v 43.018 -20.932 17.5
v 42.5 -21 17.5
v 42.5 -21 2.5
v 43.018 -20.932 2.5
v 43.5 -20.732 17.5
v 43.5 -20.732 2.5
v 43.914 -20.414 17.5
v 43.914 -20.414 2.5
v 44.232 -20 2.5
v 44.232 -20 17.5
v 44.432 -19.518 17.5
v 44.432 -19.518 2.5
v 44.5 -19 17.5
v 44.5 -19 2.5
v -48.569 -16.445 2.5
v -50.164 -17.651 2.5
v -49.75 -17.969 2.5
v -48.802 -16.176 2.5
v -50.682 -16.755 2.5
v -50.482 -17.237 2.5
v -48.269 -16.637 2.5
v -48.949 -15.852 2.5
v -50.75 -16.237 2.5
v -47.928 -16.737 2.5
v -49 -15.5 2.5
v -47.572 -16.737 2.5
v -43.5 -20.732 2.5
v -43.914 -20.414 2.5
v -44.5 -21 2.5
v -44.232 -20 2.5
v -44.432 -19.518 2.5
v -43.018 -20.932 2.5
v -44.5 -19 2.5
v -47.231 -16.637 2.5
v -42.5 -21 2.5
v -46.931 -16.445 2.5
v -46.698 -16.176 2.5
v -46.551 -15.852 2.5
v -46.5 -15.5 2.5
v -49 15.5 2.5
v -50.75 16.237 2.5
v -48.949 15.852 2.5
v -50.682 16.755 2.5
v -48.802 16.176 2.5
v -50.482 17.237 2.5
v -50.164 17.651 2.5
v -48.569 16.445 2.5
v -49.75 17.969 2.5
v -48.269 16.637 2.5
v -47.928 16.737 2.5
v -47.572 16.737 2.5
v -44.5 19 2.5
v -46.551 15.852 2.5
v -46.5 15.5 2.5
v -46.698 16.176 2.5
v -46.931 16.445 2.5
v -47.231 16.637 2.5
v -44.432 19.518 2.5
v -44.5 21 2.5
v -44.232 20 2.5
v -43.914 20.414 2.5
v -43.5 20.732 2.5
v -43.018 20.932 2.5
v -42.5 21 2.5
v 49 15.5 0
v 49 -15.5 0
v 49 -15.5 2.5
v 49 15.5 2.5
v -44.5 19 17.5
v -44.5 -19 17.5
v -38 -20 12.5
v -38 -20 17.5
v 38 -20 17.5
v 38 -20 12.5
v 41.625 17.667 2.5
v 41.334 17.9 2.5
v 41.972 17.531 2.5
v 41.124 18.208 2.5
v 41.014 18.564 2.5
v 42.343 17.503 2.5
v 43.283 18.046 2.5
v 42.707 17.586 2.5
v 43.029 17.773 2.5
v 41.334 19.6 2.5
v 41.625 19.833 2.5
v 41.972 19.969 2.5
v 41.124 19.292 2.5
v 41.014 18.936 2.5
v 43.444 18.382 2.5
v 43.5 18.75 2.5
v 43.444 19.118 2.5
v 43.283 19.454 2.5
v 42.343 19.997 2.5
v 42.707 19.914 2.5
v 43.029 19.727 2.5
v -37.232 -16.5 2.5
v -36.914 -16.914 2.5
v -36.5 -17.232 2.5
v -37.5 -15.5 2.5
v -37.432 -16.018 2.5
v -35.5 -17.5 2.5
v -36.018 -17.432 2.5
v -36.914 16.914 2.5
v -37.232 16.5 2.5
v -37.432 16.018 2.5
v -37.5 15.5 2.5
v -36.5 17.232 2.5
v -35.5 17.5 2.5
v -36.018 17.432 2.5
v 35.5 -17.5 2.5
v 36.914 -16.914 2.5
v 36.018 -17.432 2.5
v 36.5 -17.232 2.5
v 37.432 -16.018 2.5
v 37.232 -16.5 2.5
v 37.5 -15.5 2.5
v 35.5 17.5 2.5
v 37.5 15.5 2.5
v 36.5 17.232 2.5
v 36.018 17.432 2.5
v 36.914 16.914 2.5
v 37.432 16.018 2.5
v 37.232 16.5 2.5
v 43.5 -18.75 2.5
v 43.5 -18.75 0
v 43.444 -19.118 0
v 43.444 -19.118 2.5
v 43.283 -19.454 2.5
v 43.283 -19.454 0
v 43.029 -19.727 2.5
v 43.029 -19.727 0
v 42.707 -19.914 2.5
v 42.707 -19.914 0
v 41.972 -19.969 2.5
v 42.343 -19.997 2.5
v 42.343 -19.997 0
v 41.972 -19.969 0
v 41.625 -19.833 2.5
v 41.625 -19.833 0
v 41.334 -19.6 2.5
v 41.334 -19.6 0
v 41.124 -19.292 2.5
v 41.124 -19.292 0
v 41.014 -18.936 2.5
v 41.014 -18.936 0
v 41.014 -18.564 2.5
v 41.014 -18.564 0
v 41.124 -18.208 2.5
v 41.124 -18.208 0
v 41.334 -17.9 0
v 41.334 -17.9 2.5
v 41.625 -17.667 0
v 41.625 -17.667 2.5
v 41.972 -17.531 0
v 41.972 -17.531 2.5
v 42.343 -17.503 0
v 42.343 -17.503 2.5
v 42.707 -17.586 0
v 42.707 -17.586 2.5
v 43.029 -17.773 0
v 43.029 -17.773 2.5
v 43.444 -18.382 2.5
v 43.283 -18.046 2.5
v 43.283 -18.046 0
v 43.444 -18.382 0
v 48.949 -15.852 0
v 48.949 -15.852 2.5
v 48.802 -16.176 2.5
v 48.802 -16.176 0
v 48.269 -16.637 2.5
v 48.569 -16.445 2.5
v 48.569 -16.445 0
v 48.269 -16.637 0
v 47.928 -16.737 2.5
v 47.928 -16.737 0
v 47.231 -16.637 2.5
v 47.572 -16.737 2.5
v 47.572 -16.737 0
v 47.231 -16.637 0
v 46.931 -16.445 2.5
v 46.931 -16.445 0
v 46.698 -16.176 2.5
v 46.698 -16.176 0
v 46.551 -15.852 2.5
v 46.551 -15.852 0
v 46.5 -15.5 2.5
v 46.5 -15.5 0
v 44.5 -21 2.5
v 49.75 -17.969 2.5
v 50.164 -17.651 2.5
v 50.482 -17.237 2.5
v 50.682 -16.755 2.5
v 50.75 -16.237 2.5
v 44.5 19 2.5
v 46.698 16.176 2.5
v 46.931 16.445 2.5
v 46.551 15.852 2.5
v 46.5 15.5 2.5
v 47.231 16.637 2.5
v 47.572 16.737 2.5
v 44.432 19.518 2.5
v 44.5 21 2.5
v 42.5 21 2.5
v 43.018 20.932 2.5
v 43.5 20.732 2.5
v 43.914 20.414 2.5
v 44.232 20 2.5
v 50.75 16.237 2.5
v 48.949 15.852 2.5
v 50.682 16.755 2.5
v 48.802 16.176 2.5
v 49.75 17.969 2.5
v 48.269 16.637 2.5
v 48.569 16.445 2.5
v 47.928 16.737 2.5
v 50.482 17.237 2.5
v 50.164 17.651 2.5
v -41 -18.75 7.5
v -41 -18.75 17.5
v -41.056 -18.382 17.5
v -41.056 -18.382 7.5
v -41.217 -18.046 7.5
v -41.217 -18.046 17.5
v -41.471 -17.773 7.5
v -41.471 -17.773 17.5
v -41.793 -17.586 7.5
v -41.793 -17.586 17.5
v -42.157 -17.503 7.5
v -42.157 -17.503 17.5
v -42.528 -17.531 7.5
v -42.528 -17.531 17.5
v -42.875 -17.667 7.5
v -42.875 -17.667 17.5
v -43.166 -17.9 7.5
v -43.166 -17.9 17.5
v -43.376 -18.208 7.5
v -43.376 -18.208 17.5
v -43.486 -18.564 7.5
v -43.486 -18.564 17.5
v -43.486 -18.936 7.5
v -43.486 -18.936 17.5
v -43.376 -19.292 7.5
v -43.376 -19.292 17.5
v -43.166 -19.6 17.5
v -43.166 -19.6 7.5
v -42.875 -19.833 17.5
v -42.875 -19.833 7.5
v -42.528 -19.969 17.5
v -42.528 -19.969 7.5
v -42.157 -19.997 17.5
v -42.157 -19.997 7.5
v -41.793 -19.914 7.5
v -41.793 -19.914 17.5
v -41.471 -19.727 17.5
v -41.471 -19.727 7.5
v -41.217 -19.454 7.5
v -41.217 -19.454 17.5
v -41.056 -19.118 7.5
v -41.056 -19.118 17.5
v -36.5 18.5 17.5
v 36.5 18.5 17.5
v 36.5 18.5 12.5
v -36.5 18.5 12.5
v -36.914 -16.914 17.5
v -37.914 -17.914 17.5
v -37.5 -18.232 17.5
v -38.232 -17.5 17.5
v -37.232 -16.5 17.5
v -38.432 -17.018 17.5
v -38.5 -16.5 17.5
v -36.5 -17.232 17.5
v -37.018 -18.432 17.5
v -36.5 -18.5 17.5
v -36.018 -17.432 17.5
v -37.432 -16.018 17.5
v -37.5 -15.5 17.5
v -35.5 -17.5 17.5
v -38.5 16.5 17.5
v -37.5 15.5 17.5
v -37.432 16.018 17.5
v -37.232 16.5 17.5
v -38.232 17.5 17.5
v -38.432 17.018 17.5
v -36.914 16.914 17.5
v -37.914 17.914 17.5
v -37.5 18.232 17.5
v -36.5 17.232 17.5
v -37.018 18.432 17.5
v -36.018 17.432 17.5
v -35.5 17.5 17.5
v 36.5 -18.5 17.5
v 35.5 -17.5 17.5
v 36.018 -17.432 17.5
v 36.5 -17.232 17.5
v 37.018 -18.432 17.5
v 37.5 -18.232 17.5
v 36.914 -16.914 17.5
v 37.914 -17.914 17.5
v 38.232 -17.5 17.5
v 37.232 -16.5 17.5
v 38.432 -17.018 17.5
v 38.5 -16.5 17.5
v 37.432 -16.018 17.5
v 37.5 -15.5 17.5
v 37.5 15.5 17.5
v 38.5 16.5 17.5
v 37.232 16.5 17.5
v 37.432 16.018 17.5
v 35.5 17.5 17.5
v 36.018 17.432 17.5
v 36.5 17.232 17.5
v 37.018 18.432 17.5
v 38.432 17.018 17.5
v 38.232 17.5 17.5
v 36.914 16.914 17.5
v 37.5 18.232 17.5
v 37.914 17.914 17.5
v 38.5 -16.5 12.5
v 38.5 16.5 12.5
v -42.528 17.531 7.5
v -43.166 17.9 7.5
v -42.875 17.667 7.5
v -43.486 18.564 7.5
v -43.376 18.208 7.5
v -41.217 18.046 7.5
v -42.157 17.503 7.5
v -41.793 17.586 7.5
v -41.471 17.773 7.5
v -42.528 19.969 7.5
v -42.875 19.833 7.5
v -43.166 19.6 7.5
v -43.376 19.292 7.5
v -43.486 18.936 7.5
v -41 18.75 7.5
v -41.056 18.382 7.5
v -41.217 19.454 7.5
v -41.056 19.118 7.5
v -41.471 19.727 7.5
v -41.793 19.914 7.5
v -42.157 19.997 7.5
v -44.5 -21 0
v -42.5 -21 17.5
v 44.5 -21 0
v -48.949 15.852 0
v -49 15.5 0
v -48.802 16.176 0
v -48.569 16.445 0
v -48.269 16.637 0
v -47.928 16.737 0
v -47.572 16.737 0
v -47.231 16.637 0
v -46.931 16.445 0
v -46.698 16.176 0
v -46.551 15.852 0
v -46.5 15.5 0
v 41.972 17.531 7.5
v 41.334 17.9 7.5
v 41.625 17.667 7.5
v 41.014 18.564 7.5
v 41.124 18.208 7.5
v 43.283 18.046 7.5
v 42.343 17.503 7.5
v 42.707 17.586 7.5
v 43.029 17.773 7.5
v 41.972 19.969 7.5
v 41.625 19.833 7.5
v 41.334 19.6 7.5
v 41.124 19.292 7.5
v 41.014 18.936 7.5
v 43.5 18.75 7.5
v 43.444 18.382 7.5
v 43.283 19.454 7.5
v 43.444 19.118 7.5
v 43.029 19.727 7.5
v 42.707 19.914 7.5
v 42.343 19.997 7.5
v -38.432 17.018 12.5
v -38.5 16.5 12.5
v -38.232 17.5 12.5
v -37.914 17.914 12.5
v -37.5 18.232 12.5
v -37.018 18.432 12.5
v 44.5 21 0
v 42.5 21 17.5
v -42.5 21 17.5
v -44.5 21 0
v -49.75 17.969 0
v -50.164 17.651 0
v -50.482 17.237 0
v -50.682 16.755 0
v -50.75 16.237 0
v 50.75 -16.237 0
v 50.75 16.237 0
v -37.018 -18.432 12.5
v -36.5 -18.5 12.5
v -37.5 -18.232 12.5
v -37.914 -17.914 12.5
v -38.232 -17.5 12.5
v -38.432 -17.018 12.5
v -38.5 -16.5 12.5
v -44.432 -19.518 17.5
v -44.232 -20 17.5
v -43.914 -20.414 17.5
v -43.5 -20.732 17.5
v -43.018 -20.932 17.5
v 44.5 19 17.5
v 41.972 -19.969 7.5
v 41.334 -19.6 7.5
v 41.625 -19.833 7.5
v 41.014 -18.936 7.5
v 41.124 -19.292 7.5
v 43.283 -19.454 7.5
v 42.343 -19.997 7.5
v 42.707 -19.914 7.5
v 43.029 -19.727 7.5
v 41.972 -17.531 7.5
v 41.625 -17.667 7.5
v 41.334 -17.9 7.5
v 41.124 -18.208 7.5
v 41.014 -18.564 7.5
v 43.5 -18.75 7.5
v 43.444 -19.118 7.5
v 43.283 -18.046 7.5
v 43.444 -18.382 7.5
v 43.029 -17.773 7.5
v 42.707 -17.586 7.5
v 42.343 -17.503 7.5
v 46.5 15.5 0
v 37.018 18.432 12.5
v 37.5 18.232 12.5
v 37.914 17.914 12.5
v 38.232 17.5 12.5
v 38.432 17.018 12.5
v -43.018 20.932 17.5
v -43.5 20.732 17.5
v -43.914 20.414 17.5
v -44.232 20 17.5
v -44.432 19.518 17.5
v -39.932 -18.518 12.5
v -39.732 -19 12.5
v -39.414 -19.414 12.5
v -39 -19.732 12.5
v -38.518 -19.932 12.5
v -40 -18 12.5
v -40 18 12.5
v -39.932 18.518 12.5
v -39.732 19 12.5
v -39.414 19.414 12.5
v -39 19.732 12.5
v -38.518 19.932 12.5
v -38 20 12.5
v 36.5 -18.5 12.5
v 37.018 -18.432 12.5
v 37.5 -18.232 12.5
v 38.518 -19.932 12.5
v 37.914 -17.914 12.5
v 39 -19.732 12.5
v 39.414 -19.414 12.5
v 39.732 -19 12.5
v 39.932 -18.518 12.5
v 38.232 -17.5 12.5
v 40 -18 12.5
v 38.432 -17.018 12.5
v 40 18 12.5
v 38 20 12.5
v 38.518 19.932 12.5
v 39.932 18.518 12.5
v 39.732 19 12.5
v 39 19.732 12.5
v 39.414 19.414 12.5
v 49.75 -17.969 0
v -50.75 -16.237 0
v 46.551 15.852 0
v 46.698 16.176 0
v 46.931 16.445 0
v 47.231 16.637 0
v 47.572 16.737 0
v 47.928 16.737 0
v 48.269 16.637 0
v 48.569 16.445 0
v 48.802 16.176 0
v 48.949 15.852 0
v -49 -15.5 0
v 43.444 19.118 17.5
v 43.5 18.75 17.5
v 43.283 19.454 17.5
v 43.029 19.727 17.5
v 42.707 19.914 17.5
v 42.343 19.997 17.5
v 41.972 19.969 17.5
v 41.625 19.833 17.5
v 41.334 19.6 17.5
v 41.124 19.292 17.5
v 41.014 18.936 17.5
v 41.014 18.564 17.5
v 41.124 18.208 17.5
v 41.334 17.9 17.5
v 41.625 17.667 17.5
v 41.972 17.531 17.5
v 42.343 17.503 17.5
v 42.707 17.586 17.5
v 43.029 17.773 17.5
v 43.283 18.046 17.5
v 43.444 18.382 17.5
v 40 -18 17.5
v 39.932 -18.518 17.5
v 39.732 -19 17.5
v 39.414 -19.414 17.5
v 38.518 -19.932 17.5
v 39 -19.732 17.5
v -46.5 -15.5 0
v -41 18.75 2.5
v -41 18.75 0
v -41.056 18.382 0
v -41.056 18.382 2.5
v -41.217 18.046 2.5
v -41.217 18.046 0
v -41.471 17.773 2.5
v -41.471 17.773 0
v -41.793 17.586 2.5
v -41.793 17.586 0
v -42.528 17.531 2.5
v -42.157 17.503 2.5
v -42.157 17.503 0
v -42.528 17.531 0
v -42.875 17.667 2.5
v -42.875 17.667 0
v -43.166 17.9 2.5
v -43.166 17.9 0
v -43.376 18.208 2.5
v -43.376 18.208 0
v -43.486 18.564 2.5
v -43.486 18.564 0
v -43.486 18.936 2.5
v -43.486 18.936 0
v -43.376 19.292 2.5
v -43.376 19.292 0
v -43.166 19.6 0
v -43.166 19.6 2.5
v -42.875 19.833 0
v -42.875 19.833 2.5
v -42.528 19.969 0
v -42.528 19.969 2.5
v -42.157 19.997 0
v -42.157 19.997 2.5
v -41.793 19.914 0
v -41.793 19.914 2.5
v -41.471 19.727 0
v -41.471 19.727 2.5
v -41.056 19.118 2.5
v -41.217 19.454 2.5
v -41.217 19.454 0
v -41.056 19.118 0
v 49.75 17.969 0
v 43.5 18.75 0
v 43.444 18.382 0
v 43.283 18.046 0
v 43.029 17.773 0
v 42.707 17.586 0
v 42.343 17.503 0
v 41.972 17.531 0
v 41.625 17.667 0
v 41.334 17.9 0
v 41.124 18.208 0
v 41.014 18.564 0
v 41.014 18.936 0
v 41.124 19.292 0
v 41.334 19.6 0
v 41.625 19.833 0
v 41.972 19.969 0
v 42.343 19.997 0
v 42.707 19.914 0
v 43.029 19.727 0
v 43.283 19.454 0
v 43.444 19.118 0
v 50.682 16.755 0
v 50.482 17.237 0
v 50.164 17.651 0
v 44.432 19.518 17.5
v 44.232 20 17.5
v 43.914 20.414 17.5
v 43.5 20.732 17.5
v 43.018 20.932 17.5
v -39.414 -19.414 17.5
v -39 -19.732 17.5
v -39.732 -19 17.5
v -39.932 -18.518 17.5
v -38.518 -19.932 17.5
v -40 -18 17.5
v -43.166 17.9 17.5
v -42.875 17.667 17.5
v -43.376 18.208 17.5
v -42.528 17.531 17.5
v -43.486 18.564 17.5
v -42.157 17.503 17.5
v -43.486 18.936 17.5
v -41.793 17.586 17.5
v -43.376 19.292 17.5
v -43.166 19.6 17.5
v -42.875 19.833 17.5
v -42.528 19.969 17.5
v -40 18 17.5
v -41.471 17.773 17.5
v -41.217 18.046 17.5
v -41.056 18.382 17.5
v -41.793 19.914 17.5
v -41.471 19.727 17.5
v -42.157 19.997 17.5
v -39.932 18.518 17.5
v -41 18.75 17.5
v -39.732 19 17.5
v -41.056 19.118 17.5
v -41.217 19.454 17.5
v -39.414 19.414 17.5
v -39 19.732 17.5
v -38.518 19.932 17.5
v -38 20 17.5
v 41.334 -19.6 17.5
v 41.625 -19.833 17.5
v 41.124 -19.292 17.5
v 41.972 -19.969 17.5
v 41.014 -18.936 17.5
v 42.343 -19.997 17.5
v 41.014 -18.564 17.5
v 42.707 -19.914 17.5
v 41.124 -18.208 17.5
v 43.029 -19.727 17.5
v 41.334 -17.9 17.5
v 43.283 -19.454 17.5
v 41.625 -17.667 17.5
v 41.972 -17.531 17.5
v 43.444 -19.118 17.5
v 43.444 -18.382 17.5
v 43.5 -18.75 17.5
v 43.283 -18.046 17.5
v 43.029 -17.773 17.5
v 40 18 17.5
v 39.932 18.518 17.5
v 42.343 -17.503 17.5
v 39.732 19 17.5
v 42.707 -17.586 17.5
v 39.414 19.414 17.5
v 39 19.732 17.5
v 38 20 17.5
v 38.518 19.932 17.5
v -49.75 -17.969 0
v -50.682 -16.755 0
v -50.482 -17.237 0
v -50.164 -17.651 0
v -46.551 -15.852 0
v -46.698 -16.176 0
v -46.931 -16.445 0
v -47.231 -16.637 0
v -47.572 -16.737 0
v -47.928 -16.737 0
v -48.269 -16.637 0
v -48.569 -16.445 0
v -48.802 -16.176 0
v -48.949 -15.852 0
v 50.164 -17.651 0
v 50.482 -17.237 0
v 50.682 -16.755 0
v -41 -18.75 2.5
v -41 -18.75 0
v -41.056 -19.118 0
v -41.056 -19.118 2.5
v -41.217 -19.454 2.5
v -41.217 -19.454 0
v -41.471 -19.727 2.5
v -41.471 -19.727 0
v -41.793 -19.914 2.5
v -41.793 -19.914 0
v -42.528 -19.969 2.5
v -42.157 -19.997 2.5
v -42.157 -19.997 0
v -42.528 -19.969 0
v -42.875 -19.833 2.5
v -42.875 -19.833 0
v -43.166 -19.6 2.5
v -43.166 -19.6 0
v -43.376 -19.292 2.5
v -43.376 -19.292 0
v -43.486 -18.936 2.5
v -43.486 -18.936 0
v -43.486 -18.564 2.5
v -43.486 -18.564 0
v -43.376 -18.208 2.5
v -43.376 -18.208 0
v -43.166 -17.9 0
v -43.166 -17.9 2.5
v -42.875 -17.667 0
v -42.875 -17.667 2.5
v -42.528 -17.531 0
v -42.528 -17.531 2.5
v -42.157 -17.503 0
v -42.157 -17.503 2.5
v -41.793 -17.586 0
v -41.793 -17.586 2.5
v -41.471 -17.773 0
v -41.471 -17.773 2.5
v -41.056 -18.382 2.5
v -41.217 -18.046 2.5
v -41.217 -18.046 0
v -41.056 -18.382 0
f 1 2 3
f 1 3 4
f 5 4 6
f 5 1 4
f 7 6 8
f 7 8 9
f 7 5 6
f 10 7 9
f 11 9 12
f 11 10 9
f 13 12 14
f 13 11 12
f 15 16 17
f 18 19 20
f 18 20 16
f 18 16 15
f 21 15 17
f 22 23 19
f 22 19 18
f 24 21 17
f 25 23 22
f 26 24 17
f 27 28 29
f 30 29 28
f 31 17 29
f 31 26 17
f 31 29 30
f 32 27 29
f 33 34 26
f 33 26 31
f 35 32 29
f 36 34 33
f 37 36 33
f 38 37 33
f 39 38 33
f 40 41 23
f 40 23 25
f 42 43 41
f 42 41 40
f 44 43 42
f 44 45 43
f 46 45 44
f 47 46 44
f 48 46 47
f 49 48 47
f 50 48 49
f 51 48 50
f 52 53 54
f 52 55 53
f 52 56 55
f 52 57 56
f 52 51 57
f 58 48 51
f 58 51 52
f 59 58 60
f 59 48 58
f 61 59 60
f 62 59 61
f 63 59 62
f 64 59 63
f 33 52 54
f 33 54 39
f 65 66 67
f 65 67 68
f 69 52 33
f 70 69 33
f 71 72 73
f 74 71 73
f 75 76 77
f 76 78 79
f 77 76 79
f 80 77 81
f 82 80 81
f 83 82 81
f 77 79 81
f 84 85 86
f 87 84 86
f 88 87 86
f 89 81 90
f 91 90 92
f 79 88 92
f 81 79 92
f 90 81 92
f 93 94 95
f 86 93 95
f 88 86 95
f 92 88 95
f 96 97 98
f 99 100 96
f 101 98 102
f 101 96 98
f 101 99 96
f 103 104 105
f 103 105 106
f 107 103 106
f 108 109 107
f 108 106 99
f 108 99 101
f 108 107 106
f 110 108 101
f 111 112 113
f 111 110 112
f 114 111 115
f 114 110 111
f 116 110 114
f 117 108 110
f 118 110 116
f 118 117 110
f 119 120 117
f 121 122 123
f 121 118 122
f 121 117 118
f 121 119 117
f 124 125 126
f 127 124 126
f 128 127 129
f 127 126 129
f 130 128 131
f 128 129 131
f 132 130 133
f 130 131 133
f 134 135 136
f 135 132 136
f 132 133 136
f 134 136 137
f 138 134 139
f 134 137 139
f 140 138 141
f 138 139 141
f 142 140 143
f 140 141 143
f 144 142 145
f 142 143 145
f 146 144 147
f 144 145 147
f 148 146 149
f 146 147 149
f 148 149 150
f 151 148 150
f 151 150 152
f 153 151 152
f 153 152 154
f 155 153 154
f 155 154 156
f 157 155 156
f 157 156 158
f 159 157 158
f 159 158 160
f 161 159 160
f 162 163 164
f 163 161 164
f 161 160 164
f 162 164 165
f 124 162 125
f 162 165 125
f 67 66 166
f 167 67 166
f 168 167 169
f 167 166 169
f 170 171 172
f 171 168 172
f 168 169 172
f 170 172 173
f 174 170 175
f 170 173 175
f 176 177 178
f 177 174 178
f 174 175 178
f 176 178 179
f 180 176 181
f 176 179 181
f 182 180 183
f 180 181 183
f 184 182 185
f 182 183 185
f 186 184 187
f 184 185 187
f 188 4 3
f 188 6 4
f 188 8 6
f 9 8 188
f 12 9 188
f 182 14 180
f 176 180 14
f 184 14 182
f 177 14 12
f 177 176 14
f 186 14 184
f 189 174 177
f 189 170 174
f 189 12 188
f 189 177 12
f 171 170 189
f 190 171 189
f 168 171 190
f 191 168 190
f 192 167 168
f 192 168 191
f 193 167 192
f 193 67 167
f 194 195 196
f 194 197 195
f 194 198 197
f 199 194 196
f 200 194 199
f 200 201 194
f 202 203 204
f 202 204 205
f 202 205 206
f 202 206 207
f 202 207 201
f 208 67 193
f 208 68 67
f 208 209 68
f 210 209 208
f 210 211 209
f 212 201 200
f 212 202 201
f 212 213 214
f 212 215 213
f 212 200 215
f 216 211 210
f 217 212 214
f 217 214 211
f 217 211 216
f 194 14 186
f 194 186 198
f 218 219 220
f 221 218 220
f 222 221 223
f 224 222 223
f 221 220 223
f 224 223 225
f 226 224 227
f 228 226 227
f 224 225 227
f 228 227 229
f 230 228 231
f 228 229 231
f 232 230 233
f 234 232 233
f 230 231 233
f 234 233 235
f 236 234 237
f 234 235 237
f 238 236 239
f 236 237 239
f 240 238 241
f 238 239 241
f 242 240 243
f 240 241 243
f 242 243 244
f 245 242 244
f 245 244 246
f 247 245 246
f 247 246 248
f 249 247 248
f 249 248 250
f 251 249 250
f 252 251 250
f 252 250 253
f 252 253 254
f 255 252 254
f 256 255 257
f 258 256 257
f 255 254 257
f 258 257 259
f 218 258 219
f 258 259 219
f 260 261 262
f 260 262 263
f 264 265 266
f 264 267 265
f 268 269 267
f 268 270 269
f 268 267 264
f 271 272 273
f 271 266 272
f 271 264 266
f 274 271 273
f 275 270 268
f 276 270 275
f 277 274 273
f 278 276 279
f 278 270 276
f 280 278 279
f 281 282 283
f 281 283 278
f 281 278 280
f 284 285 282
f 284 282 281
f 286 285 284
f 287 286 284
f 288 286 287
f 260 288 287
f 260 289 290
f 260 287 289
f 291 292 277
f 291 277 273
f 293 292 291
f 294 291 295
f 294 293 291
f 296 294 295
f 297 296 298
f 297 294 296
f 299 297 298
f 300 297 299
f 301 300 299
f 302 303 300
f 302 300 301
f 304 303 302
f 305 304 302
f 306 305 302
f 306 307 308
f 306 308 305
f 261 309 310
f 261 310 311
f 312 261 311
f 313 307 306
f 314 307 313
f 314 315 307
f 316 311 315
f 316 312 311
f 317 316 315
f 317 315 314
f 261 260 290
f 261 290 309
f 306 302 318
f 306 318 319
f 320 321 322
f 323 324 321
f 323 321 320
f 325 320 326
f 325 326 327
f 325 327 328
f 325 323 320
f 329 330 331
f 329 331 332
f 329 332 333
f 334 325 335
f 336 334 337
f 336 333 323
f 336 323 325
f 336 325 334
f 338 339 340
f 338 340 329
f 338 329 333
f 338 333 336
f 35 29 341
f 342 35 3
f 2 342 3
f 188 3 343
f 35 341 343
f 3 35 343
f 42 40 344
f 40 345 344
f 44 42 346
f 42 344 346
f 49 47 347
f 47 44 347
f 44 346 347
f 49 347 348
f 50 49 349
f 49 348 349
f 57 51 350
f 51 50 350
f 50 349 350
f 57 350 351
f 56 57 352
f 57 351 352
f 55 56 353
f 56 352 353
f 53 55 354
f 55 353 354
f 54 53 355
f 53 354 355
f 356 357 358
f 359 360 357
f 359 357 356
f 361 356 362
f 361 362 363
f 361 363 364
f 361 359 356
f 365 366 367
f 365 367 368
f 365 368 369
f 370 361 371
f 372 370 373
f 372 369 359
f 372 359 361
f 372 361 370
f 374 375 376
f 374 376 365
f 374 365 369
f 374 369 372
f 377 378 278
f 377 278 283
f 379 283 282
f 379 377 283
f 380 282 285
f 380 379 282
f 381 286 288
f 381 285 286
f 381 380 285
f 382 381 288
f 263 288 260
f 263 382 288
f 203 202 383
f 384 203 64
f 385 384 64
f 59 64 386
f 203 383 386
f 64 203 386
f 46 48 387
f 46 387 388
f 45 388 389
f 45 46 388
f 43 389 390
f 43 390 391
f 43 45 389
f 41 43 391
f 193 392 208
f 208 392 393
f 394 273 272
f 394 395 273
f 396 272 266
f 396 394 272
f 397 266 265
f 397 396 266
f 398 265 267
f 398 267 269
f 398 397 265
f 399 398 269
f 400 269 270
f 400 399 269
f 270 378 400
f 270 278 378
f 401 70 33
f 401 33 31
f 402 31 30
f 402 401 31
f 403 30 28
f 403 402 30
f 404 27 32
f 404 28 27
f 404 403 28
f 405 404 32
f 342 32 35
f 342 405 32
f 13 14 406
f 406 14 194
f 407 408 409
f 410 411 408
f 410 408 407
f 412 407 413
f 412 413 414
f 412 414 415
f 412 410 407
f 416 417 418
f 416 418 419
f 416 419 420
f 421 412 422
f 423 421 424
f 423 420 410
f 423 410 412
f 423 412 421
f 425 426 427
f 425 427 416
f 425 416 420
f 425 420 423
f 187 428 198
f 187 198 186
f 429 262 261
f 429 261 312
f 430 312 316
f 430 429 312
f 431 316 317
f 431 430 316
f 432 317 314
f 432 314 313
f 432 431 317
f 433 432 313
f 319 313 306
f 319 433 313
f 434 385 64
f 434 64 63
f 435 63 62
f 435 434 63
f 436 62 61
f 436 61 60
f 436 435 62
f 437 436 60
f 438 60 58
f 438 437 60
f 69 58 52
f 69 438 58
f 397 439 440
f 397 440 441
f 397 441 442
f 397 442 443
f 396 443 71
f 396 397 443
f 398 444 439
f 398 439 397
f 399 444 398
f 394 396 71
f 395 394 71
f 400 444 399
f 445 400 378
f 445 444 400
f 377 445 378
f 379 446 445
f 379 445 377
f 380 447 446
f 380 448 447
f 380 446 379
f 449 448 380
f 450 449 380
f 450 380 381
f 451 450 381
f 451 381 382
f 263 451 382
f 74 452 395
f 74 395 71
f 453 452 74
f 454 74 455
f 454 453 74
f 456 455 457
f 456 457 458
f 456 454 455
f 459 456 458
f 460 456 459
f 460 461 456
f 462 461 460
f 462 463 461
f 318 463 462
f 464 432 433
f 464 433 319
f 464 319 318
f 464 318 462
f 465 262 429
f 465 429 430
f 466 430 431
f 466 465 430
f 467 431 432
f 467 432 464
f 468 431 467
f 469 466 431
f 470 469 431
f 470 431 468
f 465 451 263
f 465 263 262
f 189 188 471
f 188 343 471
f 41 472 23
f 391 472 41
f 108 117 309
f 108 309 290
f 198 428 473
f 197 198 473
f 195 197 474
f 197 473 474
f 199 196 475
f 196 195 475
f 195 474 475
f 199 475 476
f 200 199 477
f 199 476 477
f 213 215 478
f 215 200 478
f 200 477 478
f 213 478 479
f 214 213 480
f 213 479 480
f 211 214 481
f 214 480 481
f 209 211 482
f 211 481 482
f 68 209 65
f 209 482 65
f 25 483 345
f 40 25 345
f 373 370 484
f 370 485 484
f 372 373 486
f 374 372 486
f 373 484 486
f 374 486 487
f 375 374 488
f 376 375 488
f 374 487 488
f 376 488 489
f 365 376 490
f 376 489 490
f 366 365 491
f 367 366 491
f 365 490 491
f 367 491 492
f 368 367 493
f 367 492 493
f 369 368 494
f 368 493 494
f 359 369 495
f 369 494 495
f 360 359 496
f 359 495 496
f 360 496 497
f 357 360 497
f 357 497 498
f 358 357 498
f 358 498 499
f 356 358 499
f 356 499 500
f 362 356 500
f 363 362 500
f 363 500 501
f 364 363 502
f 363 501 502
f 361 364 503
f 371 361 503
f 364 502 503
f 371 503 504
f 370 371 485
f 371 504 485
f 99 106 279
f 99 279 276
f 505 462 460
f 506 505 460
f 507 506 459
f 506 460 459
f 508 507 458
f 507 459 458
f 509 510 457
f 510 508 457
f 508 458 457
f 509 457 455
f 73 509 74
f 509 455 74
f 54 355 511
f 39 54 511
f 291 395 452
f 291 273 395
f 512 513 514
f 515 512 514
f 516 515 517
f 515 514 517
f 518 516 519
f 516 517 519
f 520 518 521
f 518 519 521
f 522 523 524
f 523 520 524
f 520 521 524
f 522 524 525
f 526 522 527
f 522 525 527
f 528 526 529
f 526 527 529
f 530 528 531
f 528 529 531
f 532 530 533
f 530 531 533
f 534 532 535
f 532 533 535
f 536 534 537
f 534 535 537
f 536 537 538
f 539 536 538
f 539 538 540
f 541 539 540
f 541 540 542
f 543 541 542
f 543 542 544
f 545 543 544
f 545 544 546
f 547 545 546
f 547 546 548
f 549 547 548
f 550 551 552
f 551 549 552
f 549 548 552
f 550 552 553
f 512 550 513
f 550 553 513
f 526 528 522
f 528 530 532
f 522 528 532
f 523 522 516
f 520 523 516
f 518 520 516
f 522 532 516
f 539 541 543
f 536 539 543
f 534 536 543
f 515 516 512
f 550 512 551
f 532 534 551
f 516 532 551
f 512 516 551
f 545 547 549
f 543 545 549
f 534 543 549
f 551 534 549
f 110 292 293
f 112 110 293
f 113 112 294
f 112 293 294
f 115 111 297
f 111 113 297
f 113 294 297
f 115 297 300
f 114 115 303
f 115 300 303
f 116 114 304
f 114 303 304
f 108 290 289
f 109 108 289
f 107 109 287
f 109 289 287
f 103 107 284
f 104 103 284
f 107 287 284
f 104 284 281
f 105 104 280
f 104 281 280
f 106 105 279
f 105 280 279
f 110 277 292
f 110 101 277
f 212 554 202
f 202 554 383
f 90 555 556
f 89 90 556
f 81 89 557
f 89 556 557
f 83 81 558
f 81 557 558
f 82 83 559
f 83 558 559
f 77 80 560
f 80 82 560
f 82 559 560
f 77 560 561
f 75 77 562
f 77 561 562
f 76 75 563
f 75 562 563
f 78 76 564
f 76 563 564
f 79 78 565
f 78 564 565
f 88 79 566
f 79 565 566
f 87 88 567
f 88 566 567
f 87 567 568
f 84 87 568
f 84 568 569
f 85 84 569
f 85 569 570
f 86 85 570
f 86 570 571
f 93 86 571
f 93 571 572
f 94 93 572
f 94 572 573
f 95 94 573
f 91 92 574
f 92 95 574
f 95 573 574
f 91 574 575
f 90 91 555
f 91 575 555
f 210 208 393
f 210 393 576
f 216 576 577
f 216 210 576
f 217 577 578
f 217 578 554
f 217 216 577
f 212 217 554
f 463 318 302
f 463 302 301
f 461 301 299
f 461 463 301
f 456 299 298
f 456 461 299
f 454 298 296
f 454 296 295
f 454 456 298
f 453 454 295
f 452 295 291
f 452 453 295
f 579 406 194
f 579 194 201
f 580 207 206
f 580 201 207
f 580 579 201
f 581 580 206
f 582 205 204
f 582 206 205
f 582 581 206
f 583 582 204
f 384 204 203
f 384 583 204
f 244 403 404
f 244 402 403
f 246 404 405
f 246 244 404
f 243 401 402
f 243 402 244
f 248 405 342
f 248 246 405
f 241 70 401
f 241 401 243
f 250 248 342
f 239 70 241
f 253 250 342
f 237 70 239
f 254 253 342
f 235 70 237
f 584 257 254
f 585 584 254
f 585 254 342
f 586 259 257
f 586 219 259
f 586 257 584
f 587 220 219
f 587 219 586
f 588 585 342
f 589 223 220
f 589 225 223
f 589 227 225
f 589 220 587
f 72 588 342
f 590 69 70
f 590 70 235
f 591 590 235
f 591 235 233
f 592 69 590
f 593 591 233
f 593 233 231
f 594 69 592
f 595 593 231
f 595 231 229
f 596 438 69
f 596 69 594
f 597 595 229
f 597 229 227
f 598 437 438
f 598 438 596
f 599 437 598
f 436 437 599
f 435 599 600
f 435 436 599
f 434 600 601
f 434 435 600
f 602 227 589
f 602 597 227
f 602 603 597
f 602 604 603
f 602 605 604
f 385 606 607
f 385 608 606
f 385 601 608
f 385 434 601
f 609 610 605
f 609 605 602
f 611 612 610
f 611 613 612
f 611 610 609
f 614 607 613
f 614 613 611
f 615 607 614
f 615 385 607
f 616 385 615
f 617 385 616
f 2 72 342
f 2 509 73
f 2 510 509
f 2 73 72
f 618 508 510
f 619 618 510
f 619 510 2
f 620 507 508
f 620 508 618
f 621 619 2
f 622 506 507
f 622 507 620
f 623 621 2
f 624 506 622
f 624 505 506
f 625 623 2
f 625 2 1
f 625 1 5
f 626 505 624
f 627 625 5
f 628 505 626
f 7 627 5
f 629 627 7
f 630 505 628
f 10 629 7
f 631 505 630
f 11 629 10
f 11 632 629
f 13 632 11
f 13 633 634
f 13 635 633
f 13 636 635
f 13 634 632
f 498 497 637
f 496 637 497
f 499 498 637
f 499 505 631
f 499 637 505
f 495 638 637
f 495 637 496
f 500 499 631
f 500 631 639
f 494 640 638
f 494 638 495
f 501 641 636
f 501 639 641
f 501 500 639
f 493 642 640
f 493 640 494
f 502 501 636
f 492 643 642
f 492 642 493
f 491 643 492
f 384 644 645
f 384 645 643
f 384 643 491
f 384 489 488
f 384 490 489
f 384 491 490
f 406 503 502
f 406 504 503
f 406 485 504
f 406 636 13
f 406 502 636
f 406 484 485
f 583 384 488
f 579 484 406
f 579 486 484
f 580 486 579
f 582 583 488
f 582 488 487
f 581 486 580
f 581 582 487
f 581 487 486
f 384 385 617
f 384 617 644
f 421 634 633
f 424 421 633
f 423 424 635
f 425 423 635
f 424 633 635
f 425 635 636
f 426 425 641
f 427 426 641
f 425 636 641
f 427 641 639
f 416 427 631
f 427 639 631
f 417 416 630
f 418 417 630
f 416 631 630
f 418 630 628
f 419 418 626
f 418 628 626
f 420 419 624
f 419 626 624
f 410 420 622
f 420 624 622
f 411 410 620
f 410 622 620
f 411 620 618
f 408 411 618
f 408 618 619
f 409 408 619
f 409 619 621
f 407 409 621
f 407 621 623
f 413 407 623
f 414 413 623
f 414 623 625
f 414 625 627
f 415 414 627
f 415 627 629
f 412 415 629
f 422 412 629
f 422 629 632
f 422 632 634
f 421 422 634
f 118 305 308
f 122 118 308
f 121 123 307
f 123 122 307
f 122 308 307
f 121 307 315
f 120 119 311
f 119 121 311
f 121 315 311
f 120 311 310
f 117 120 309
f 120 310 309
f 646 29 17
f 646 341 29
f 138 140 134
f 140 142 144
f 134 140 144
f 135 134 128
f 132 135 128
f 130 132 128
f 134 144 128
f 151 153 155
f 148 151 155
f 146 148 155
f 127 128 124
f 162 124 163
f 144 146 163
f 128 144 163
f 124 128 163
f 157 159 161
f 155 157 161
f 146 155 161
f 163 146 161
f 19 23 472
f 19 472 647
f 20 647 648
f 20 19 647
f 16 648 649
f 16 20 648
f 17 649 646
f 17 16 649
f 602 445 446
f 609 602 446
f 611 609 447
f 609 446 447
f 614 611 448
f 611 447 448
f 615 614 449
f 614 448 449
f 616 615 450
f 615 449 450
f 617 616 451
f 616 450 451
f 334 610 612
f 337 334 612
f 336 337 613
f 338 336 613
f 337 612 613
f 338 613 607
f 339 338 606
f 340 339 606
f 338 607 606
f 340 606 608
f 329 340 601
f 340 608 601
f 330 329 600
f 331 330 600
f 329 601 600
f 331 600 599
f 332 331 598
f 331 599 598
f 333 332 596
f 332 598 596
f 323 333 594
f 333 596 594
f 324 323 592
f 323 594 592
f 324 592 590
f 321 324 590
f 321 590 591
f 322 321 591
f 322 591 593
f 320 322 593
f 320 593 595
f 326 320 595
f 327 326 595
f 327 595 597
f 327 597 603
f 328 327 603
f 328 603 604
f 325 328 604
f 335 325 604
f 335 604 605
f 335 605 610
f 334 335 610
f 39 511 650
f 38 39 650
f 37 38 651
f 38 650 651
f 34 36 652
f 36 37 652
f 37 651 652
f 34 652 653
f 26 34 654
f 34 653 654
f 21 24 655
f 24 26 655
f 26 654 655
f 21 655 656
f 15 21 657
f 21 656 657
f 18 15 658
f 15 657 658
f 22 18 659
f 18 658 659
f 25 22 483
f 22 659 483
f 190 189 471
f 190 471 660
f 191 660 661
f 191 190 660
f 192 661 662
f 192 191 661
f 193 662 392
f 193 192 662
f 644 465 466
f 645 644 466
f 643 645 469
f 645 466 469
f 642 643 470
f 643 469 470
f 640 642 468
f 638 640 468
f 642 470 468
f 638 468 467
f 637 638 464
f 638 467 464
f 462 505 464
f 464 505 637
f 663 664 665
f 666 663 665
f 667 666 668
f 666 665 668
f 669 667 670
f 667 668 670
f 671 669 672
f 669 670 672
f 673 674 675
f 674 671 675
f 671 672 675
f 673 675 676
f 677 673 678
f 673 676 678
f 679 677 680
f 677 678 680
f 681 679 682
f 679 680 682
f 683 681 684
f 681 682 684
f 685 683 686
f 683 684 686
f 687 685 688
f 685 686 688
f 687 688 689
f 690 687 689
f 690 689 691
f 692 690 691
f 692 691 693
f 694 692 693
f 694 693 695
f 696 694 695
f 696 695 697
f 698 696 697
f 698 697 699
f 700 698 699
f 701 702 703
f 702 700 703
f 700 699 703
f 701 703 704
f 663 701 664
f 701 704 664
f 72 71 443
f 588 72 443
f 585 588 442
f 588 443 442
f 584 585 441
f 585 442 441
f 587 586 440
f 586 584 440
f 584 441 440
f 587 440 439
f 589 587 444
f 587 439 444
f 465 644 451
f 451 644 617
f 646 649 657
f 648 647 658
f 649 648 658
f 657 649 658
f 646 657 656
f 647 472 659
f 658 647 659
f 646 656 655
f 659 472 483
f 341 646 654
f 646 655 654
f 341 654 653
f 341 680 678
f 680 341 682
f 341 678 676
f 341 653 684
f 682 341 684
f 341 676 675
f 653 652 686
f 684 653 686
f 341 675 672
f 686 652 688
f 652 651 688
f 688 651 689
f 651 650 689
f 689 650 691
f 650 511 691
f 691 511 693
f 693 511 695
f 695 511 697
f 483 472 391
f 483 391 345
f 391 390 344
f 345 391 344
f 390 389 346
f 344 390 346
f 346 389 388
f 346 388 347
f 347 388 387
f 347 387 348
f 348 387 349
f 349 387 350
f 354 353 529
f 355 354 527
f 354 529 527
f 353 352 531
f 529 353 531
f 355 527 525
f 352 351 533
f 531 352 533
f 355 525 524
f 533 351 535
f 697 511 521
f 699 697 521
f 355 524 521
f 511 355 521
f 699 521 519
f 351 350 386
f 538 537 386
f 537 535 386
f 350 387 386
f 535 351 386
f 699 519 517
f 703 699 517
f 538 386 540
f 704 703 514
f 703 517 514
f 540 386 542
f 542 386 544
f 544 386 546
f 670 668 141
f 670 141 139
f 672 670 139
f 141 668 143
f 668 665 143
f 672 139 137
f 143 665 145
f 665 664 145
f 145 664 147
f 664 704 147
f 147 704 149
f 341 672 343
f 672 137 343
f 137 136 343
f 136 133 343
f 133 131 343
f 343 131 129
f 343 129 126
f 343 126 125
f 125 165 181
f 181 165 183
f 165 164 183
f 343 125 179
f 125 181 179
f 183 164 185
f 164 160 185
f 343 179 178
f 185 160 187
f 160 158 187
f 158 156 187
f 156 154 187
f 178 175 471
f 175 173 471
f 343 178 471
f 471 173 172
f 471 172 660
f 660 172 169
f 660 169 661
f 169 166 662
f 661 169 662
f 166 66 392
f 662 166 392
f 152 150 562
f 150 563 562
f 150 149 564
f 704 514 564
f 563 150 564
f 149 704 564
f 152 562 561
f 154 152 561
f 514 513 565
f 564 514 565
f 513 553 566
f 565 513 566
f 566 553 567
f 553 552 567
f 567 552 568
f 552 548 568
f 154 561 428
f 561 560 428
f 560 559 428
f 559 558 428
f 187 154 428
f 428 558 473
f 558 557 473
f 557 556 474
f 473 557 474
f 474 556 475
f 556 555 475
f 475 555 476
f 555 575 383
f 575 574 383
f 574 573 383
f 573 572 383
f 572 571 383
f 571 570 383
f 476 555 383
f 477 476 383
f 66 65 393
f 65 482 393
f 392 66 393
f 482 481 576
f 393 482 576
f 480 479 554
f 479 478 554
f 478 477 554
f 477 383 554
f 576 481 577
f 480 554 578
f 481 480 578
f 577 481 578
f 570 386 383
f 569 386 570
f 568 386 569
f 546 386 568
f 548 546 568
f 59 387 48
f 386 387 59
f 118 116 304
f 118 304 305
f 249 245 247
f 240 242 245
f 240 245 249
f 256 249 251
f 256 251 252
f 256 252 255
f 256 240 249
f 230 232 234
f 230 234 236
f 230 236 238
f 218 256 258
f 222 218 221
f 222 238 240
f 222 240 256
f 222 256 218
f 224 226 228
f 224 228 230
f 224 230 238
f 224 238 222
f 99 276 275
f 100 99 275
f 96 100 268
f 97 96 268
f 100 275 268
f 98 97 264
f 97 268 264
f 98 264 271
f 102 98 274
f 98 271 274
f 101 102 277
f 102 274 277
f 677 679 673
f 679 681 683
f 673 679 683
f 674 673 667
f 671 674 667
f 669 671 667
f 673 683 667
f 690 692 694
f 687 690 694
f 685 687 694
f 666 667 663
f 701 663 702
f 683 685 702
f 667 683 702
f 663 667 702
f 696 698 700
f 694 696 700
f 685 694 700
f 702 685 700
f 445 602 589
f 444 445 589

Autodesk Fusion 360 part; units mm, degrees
sketch "Sketch1" plane through (0, 0, 0) normal (0, 0, 1) x (1, 0, 0)
  line L0 (37.5, 17.5) -> (-37.5, 17.5)
  line L1 (-37.5, 17.5) -> (-37.5, -17.5)
  line L2 (-37.5, -17.5) -> (37.5, -17.5)
  line L3 (37.5, -17.5) -> (37.5, 17.5)
  line L4 (37.5, 17.5) -> (-37.5, -17.5) construction
  line L5 (-37.5, 17.5) -> (37.5, -17.5) construction
  line L6 (44.5, 21) -> (-44.5, 21)
  line L7 (-44.5, 21) -> (-44.5, -21)
  line L8 (-44.5, -21) -> (44.5, -21)
  line L9 (44.5, -21) -> (44.5, 21)
  line L10 (44.5, 21) -> (-44.5, -21) construction
  line L11 (-44.5, 21) -> (44.5, -21) construction
  line L12 (0, 2.5) -> (0, 20)
  line L13 (44.5, -21) -> (50.75, -17.3916)
  line L14 (50.75, -17.3916) -> (50.75, 17.3916)
  line L15 (50.75, 17.3916) -> (44.5, 21)
  line L16 (46.5, 15.5) -> (46.5, -15.5)
  arc A0 (46.5, -15.5) -> (49, -15.5) centre (47.75, -15.5) ccw
  line L17 (49, -15.5) -> (49, 15.5)
  arc A1 (49, 15.5) -> (46.5, 15.5) centre (47.75, 15.5) ccw
  line L18 (47.75, 15.5) -> (47.75, -15.5) construction
  arc A2 (-49, -15.5) -> (-46.5, -15.5) centre (-47.75, -15.5) ccw
  line L19 (-46.5, 15.5) -> (-46.5, -15.5)
  line L20 (-49, -15.5) -> (-49, 15.5)
  arc A3 (-46.5, 15.5) -> (-49, 15.5) centre (-47.75, 15.5) ccw
  line L21 (-50.75, 17.3916) -> (-44.5, 21)
  line L22 (-50.75, -17.3916) -> (-50.75, 17.3916)
  line L23 (-44.5, -21) -> (-50.75, -17.3916)
  line L24 (38.5, 18.5) -> (-38.5, 18.5)
  line L25 (-38.5, 18.5) -> (-38.5, -18.5)
  line L26 (-38.5, -18.5) -> (38.5, -18.5)
  line L27 (38.5, -18.5) -> (38.5, 18.5)
  line L28 (38.5, 18.5) -> (-38.5, -18.5) construction
  line L29 (-38.5, 18.5) -> (38.5, -18.5) construction
  line L30 (40, 20) -> (-40, 20)
  line L31 (-40, 20) -> (-40, -20)
  line L32 (-40, -20) -> (40, -20)
  line L33 (40, -20) -> (40, 20)
  line L34 (40, 20) -> (-40, -20) construction
  line L35 (-40, 20) -> (40, -20) construction
  circle A4 centre (42.25, 18.75) radius 1.25
  circle A5 centre (-42.25, 18.75) radius 1.25
  line L36 (20, 0) -> (2.5, 0)
  circle A6 centre (42.25, -18.75) radius 1.25
  circle A7 centre (-42.25, -18.75) radius 1.25
  line L37 (-107, 0) -> (107, 0)
  point P0 (47.75, 0)
  dimension "d1" = 35
  dimension "d3" = 75
  dimension "d26" = 120
  dimension "d46" = 3.5
  dimension "d47" = 1
  dimension "d48" = 1
  dimension "d49" = 1
  dimension "d51" = 1.5
  dimension "d52" = 89
  dimension "d53" = 2.5
  dimension "d54" = 2.25
  dimension "d55" = 2.25
  dimension "d56" = 2.5
  dimension "d57" = 6.25
  dimension "d66" = 2
  dimension "d67" = 31
extrude "Extrude2" add sketch "Sketch1" along normal blind 2.5 contours L0 L1 L3 L36 L37 | L0 L3 L12 L24 L27 L37 | L0 L1 L12 L24 L25 L37 | L1 L2 L3 L25 L26 L27 L37 | L1 L2 L3 L36 L37 | L12 L24 L25 L30 L31 L37 | L12 L24 L27 L30 L33 L37 | L25 L26 L27 L31 L32 L33 L37 | L6 L7 L9 L30 L31 L33 L37 | L7 L8 L9 L31 L32 L33 L37 | L9 L13 L14 L16 A0 L17 L37 | L9 L14 L15 L16 L17 A1 L37 | L7 L19 L20 A3 L21 L22 L37 | L7 A2 L19 L20 L22 L23 L37
extrude "Extrude14" add sketch "Sketch1" along normal blind 15 from surface at 2.5 contours L0 L3 L12 L24 L27 L37 | L0 L1 L12 L24 L25 L37 | L1 L2 L3 L25 L26 L27 L37 | L12 L24 L25 L30 L31 L37 | L12 L24 L27 L30 L33 L37 | L25 L26 L27 L31 L32 L33 L37 | L6 L7 L9 L30 L31 L33 L37 | L7 L8 L9 L31 L32 L33 L37 | A4 | A5 | A6 | A7
extrude "Extrude15" cut sketch "Sketch1" against normal blind 5 from surface at 17.5 contours L12 L24 L25 L30 L31 L37 | L12 L24 L27 L30 L33 L37 | L25 L26 L27 L31 L32 L33 L37
extrude "Extrude16" cut sketch "Sketch1" against normal blind 10 from surface at 17.5 contours A4 | A5 | A6 | A7
fillet "Fillet5" radius 2 20 edges at (-50.75, -17.3916, 1.25) (-44.5, -21, 10) (-50.75, 17.3916, 1.25) (-44.5, 21, 10) (-38.5, 18.5, 15) (-40, 20, 15) (-37.5, 17.5, 10) (-37.5, -17.5, 10) (-38.5, -18.5, 15) (-40, -20, 15) (37.5, 17.5, 10) (40, 20, 15) (37.5, -17.5, 10) (38.5, -18.5, 15) (40, -20, 15) (44.5, -21, 10) (50.75, -17.3916, 1.25) (38.5, 18.5, 15) (44.5, 21, 10) (50.75, 17.3916, 1.25)
equation "d7 = 2.50 mm"
equation "d48 = d47"
equation "d49 = d47"
equation "d51 = d46 - 2 * d47"
equation "d52 = d3 + 2 * d46 + 2 * d47 + 2 * d53"
equation "d54 = d47 + 0.5 * d53"
equation "d55 = d47 + 0.5 * d53"
equation "d56 = d53"
equation "d57 = d54 + 4 * d47"
equation "d66 = 2 * d47"
equation "d67 = d1 - 4 * d47"
equation "d80 = d7"
equation "d81 = 15 mm"
equation "d83 = d7 + d81"
equation "d86 = d7 + d81"
